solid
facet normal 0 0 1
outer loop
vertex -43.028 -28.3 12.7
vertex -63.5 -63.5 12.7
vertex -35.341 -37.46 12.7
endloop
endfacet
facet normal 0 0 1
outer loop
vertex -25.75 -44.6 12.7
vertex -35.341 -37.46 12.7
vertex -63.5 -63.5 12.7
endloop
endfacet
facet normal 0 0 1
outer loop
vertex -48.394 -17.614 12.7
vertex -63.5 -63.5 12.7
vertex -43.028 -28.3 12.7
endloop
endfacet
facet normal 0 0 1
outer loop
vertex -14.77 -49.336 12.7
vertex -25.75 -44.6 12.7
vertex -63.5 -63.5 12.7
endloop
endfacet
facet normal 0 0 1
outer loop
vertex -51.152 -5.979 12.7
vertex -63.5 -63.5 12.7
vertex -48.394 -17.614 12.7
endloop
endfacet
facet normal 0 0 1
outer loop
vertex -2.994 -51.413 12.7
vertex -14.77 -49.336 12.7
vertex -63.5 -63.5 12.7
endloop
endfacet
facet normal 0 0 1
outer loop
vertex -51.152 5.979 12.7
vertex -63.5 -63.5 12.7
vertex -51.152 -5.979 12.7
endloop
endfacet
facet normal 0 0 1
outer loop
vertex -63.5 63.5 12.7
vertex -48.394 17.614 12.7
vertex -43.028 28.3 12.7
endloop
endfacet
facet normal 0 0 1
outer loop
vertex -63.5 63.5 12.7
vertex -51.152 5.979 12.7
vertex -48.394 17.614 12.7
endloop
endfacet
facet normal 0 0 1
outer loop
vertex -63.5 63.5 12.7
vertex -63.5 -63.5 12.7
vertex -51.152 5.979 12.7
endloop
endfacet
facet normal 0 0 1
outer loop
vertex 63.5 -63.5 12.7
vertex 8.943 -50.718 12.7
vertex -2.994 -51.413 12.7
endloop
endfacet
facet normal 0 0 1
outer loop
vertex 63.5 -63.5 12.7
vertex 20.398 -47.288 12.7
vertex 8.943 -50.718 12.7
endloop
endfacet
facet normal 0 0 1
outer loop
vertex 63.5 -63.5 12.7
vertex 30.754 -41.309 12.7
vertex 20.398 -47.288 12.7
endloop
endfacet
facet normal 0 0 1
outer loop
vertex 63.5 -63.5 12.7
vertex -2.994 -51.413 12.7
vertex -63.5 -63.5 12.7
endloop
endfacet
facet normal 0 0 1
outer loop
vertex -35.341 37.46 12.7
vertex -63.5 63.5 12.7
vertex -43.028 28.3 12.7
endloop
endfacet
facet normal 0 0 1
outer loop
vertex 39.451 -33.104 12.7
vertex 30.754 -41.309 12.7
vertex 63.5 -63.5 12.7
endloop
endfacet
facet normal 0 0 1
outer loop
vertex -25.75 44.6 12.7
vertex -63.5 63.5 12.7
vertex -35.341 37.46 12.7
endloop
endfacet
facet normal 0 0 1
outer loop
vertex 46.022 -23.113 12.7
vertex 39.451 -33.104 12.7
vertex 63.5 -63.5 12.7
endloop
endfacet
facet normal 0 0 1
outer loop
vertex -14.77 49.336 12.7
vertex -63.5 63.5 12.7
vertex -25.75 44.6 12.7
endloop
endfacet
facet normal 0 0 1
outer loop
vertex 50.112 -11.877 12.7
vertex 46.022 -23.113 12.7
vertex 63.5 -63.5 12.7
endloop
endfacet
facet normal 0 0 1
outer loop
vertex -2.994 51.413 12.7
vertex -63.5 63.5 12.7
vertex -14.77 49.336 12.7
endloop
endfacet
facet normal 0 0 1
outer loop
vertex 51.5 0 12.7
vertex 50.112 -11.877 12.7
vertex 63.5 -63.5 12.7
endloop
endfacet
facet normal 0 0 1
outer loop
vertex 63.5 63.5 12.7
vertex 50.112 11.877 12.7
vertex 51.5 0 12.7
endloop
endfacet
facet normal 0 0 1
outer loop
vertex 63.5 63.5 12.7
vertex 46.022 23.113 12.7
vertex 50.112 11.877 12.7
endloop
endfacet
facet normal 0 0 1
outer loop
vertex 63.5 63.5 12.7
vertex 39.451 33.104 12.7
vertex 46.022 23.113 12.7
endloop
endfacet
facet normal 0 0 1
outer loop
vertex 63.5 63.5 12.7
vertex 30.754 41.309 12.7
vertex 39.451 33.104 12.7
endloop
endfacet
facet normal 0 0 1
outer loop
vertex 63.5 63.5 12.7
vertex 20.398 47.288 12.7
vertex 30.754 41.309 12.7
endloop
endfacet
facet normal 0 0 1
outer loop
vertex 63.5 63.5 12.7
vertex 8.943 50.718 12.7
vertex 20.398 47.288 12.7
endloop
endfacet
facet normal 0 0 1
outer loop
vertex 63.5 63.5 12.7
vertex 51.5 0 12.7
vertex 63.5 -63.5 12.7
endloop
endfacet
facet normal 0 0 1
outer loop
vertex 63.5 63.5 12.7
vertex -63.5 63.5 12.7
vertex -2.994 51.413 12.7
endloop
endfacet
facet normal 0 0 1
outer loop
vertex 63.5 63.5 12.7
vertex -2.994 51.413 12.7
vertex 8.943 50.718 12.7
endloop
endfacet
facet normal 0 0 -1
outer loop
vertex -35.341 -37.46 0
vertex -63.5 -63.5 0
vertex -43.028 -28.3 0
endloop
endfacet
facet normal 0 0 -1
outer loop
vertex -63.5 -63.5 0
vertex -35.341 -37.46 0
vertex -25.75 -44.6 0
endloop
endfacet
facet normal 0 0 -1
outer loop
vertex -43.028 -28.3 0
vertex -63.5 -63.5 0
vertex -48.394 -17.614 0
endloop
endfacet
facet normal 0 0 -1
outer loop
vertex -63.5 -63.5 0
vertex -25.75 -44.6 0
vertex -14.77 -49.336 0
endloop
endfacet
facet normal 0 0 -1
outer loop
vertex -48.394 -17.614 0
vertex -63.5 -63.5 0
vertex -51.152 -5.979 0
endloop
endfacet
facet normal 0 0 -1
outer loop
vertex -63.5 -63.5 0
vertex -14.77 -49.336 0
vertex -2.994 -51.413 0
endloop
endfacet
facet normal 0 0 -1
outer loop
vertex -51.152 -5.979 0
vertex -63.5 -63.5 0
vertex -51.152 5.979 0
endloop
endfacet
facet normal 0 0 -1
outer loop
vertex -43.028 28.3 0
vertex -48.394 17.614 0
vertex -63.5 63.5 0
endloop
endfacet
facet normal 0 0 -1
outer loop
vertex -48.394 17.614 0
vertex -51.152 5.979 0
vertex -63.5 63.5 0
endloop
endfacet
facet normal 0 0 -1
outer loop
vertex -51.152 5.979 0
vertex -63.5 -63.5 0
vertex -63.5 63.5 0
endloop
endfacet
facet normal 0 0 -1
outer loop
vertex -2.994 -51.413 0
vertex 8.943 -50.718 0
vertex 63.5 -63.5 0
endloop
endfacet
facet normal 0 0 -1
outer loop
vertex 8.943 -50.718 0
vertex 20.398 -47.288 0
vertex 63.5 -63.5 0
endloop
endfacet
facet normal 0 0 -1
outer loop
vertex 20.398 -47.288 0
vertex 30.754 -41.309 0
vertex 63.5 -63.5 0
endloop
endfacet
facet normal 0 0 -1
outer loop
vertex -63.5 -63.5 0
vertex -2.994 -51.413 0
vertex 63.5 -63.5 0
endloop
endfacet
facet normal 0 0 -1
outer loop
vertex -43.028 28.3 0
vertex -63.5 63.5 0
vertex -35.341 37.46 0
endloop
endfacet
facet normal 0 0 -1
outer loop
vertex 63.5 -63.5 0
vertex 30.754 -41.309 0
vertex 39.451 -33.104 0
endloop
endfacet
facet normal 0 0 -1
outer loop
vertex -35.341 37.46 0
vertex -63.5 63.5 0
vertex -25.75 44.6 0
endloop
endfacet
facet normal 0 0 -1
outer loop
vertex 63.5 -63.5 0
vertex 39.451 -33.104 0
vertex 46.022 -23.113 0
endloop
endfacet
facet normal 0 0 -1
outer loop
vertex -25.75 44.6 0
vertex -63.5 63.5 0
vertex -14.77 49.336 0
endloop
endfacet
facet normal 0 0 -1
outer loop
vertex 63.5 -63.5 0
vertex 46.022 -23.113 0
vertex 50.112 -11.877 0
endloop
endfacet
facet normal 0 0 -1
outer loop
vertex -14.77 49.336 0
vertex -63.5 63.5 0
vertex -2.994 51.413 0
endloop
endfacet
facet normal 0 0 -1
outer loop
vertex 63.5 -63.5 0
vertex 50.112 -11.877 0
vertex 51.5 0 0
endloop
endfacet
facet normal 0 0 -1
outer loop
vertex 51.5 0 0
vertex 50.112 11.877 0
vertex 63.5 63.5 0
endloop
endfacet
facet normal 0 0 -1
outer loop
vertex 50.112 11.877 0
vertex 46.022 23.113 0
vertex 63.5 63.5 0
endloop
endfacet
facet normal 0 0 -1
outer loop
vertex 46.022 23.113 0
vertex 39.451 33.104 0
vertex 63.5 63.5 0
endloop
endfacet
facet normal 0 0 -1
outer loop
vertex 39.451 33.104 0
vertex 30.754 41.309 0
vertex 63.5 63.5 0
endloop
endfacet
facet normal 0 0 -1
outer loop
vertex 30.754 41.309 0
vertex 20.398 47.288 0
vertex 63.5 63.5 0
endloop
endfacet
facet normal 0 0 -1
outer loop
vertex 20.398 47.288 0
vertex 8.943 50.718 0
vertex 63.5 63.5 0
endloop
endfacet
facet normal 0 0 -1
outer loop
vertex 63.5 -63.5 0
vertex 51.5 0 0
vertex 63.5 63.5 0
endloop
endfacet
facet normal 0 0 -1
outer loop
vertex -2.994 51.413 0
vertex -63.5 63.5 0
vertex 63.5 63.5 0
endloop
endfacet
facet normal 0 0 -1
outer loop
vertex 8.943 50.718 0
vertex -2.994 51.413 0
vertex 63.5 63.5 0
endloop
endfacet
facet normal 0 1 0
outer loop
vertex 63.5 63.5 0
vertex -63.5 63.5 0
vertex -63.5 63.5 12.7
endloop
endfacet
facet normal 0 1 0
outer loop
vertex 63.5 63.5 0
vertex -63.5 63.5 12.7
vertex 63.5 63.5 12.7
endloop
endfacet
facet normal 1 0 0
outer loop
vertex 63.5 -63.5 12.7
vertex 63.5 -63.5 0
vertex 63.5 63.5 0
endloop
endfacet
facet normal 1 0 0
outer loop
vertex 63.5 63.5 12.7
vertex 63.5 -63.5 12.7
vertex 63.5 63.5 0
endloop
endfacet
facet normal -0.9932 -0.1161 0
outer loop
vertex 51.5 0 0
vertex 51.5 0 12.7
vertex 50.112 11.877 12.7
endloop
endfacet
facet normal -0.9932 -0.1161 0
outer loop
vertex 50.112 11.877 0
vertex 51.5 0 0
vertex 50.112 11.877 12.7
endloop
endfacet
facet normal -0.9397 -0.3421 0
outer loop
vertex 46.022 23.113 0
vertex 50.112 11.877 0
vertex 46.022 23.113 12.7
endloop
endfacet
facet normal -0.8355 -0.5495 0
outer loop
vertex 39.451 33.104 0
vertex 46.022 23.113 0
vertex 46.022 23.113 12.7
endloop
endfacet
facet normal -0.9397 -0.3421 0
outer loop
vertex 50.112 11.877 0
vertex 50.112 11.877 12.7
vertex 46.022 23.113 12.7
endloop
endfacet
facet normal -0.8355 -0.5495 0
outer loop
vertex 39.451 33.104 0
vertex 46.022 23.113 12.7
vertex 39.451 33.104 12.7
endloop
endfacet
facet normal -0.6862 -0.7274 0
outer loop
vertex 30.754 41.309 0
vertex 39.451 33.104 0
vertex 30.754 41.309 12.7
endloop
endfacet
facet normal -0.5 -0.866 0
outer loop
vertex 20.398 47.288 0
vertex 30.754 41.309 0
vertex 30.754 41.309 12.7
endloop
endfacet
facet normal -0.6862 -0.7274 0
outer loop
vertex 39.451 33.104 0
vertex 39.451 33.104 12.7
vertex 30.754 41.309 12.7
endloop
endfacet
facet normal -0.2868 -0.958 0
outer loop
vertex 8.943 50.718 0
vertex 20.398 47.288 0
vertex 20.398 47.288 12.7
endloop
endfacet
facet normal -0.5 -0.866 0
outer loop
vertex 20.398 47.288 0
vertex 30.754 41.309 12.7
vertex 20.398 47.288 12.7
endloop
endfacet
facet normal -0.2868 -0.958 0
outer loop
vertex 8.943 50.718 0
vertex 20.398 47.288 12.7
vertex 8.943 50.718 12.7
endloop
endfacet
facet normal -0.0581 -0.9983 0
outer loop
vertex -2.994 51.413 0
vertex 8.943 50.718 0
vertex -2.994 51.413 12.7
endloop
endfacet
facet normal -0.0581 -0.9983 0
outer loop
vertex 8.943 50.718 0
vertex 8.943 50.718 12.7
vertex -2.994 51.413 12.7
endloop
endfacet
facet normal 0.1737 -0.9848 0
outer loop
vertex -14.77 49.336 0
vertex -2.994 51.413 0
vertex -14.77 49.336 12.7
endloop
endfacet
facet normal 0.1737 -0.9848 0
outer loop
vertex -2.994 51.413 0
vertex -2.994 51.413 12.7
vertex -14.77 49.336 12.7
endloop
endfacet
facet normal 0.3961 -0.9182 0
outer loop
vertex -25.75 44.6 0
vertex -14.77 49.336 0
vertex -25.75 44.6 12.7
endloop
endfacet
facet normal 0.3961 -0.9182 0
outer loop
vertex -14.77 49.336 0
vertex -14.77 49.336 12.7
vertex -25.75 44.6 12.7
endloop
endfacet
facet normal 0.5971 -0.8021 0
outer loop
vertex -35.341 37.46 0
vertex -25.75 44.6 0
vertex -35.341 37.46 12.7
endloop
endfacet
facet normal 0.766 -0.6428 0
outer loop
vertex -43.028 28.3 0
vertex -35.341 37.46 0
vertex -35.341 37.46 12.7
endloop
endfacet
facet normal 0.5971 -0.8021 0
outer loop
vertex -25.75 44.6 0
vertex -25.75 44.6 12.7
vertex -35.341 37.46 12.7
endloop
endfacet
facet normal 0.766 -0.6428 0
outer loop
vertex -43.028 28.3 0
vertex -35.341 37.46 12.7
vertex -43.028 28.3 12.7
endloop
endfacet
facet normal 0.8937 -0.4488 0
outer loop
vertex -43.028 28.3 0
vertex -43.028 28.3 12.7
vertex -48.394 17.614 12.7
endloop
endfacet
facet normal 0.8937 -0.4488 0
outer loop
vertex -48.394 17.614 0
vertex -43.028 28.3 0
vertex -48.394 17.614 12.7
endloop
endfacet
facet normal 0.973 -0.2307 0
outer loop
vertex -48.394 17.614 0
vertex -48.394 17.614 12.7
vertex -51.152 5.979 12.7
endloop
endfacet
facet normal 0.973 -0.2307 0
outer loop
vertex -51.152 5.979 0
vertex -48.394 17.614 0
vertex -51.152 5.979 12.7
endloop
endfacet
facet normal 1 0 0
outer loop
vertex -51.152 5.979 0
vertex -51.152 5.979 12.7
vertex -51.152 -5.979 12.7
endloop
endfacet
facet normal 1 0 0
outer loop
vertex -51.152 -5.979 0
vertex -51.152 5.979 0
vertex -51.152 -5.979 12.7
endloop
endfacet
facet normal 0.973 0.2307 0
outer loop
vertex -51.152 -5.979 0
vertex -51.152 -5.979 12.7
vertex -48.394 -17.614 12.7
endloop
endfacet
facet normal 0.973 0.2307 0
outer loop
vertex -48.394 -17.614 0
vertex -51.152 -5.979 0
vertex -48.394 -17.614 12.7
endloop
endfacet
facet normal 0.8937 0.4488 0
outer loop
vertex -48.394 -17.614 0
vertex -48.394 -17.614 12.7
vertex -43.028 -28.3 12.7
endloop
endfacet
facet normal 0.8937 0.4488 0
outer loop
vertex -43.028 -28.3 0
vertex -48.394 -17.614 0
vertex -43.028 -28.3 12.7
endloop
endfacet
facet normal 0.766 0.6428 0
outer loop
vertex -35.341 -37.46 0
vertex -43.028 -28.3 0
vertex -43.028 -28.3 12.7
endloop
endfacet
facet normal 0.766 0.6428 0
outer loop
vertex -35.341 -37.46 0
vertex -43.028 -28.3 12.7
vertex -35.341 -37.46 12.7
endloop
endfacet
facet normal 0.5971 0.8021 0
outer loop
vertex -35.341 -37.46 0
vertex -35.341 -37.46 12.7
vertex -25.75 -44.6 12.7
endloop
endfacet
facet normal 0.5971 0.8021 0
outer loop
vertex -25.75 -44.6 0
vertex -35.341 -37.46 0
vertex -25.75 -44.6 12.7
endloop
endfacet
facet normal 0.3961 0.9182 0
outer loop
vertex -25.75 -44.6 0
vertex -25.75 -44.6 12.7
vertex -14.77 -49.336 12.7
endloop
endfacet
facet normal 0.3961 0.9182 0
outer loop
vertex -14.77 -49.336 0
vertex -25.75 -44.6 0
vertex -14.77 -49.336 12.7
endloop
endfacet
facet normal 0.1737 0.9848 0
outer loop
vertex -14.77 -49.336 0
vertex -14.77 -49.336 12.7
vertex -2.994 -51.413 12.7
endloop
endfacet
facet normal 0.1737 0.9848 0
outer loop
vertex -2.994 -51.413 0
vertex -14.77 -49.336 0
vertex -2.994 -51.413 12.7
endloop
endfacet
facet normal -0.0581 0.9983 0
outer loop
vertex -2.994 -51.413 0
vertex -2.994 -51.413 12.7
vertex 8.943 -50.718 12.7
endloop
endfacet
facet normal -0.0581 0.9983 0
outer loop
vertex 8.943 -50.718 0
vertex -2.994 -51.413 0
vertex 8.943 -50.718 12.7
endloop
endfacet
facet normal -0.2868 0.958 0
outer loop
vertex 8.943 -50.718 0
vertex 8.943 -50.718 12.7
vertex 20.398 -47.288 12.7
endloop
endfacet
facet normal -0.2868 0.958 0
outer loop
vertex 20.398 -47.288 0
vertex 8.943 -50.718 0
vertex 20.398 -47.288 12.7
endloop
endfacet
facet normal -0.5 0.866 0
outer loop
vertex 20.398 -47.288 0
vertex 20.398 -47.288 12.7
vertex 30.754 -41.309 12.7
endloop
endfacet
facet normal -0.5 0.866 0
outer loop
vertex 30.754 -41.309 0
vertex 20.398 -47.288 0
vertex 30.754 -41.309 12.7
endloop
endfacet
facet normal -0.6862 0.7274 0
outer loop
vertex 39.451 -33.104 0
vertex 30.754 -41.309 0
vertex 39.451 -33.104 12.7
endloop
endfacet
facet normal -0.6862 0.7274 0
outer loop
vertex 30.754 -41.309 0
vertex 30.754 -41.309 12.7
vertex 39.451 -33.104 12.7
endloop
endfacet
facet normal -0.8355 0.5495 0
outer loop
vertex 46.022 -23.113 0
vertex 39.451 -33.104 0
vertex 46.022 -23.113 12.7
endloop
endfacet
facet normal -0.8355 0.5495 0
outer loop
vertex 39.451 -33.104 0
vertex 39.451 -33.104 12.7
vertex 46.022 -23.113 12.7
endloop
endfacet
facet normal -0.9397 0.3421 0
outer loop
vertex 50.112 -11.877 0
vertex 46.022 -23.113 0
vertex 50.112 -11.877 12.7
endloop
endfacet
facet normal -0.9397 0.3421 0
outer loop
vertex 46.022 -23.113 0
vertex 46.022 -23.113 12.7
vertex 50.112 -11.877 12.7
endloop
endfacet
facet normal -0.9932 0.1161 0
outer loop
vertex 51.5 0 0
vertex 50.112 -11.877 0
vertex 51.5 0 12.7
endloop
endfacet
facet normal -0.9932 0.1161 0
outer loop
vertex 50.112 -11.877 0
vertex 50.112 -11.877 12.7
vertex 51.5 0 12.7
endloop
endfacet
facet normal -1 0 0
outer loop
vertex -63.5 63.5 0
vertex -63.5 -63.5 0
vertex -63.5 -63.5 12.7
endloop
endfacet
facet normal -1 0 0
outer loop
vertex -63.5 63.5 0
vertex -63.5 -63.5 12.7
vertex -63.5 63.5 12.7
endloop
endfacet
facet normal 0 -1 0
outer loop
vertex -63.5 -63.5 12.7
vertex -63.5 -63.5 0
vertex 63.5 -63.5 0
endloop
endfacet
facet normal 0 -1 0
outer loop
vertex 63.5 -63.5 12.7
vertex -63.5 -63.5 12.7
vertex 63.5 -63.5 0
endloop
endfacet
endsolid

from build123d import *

# Parameters (mm, degrees)
SKETCH1_W           = 127
SKETCH1_H           = 127
BOSS_EXTRUDE1_DEPTH = 12.7
CUT_EXTRUDE1_REACH  = 14.7
SKETCH2_R           = 51.5


with BuildPart() as part:
    # Sketch1 → Boss-Extrude1 (new body)
    with BuildSketch(Plane.XY):
        Rectangle(SKETCH1_W, SKETCH1_H)
    extrude(amount=BOSS_EXTRUDE1_DEPTH)

    # Sketch2 → Cut-Extrude1 (cut, up to next)
    with BuildSketch(Plane.XY.offset(12.7), mode=Mode.PRIVATE) as cut_extrude1_sk1:
        Circle(SKETCH2_R)
    cut_extrude1_tool1 = extrude(cut_extrude1_sk1.sketch, amount=-CUT_EXTRUDE1_REACH, mode=Mode.PRIVATE) & part.part
    add(cut_extrude1_tool1.solids().sort_by_distance((0, 0, 12.7))[0], mode=Mode.SUBTRACT)


solid = part.part
